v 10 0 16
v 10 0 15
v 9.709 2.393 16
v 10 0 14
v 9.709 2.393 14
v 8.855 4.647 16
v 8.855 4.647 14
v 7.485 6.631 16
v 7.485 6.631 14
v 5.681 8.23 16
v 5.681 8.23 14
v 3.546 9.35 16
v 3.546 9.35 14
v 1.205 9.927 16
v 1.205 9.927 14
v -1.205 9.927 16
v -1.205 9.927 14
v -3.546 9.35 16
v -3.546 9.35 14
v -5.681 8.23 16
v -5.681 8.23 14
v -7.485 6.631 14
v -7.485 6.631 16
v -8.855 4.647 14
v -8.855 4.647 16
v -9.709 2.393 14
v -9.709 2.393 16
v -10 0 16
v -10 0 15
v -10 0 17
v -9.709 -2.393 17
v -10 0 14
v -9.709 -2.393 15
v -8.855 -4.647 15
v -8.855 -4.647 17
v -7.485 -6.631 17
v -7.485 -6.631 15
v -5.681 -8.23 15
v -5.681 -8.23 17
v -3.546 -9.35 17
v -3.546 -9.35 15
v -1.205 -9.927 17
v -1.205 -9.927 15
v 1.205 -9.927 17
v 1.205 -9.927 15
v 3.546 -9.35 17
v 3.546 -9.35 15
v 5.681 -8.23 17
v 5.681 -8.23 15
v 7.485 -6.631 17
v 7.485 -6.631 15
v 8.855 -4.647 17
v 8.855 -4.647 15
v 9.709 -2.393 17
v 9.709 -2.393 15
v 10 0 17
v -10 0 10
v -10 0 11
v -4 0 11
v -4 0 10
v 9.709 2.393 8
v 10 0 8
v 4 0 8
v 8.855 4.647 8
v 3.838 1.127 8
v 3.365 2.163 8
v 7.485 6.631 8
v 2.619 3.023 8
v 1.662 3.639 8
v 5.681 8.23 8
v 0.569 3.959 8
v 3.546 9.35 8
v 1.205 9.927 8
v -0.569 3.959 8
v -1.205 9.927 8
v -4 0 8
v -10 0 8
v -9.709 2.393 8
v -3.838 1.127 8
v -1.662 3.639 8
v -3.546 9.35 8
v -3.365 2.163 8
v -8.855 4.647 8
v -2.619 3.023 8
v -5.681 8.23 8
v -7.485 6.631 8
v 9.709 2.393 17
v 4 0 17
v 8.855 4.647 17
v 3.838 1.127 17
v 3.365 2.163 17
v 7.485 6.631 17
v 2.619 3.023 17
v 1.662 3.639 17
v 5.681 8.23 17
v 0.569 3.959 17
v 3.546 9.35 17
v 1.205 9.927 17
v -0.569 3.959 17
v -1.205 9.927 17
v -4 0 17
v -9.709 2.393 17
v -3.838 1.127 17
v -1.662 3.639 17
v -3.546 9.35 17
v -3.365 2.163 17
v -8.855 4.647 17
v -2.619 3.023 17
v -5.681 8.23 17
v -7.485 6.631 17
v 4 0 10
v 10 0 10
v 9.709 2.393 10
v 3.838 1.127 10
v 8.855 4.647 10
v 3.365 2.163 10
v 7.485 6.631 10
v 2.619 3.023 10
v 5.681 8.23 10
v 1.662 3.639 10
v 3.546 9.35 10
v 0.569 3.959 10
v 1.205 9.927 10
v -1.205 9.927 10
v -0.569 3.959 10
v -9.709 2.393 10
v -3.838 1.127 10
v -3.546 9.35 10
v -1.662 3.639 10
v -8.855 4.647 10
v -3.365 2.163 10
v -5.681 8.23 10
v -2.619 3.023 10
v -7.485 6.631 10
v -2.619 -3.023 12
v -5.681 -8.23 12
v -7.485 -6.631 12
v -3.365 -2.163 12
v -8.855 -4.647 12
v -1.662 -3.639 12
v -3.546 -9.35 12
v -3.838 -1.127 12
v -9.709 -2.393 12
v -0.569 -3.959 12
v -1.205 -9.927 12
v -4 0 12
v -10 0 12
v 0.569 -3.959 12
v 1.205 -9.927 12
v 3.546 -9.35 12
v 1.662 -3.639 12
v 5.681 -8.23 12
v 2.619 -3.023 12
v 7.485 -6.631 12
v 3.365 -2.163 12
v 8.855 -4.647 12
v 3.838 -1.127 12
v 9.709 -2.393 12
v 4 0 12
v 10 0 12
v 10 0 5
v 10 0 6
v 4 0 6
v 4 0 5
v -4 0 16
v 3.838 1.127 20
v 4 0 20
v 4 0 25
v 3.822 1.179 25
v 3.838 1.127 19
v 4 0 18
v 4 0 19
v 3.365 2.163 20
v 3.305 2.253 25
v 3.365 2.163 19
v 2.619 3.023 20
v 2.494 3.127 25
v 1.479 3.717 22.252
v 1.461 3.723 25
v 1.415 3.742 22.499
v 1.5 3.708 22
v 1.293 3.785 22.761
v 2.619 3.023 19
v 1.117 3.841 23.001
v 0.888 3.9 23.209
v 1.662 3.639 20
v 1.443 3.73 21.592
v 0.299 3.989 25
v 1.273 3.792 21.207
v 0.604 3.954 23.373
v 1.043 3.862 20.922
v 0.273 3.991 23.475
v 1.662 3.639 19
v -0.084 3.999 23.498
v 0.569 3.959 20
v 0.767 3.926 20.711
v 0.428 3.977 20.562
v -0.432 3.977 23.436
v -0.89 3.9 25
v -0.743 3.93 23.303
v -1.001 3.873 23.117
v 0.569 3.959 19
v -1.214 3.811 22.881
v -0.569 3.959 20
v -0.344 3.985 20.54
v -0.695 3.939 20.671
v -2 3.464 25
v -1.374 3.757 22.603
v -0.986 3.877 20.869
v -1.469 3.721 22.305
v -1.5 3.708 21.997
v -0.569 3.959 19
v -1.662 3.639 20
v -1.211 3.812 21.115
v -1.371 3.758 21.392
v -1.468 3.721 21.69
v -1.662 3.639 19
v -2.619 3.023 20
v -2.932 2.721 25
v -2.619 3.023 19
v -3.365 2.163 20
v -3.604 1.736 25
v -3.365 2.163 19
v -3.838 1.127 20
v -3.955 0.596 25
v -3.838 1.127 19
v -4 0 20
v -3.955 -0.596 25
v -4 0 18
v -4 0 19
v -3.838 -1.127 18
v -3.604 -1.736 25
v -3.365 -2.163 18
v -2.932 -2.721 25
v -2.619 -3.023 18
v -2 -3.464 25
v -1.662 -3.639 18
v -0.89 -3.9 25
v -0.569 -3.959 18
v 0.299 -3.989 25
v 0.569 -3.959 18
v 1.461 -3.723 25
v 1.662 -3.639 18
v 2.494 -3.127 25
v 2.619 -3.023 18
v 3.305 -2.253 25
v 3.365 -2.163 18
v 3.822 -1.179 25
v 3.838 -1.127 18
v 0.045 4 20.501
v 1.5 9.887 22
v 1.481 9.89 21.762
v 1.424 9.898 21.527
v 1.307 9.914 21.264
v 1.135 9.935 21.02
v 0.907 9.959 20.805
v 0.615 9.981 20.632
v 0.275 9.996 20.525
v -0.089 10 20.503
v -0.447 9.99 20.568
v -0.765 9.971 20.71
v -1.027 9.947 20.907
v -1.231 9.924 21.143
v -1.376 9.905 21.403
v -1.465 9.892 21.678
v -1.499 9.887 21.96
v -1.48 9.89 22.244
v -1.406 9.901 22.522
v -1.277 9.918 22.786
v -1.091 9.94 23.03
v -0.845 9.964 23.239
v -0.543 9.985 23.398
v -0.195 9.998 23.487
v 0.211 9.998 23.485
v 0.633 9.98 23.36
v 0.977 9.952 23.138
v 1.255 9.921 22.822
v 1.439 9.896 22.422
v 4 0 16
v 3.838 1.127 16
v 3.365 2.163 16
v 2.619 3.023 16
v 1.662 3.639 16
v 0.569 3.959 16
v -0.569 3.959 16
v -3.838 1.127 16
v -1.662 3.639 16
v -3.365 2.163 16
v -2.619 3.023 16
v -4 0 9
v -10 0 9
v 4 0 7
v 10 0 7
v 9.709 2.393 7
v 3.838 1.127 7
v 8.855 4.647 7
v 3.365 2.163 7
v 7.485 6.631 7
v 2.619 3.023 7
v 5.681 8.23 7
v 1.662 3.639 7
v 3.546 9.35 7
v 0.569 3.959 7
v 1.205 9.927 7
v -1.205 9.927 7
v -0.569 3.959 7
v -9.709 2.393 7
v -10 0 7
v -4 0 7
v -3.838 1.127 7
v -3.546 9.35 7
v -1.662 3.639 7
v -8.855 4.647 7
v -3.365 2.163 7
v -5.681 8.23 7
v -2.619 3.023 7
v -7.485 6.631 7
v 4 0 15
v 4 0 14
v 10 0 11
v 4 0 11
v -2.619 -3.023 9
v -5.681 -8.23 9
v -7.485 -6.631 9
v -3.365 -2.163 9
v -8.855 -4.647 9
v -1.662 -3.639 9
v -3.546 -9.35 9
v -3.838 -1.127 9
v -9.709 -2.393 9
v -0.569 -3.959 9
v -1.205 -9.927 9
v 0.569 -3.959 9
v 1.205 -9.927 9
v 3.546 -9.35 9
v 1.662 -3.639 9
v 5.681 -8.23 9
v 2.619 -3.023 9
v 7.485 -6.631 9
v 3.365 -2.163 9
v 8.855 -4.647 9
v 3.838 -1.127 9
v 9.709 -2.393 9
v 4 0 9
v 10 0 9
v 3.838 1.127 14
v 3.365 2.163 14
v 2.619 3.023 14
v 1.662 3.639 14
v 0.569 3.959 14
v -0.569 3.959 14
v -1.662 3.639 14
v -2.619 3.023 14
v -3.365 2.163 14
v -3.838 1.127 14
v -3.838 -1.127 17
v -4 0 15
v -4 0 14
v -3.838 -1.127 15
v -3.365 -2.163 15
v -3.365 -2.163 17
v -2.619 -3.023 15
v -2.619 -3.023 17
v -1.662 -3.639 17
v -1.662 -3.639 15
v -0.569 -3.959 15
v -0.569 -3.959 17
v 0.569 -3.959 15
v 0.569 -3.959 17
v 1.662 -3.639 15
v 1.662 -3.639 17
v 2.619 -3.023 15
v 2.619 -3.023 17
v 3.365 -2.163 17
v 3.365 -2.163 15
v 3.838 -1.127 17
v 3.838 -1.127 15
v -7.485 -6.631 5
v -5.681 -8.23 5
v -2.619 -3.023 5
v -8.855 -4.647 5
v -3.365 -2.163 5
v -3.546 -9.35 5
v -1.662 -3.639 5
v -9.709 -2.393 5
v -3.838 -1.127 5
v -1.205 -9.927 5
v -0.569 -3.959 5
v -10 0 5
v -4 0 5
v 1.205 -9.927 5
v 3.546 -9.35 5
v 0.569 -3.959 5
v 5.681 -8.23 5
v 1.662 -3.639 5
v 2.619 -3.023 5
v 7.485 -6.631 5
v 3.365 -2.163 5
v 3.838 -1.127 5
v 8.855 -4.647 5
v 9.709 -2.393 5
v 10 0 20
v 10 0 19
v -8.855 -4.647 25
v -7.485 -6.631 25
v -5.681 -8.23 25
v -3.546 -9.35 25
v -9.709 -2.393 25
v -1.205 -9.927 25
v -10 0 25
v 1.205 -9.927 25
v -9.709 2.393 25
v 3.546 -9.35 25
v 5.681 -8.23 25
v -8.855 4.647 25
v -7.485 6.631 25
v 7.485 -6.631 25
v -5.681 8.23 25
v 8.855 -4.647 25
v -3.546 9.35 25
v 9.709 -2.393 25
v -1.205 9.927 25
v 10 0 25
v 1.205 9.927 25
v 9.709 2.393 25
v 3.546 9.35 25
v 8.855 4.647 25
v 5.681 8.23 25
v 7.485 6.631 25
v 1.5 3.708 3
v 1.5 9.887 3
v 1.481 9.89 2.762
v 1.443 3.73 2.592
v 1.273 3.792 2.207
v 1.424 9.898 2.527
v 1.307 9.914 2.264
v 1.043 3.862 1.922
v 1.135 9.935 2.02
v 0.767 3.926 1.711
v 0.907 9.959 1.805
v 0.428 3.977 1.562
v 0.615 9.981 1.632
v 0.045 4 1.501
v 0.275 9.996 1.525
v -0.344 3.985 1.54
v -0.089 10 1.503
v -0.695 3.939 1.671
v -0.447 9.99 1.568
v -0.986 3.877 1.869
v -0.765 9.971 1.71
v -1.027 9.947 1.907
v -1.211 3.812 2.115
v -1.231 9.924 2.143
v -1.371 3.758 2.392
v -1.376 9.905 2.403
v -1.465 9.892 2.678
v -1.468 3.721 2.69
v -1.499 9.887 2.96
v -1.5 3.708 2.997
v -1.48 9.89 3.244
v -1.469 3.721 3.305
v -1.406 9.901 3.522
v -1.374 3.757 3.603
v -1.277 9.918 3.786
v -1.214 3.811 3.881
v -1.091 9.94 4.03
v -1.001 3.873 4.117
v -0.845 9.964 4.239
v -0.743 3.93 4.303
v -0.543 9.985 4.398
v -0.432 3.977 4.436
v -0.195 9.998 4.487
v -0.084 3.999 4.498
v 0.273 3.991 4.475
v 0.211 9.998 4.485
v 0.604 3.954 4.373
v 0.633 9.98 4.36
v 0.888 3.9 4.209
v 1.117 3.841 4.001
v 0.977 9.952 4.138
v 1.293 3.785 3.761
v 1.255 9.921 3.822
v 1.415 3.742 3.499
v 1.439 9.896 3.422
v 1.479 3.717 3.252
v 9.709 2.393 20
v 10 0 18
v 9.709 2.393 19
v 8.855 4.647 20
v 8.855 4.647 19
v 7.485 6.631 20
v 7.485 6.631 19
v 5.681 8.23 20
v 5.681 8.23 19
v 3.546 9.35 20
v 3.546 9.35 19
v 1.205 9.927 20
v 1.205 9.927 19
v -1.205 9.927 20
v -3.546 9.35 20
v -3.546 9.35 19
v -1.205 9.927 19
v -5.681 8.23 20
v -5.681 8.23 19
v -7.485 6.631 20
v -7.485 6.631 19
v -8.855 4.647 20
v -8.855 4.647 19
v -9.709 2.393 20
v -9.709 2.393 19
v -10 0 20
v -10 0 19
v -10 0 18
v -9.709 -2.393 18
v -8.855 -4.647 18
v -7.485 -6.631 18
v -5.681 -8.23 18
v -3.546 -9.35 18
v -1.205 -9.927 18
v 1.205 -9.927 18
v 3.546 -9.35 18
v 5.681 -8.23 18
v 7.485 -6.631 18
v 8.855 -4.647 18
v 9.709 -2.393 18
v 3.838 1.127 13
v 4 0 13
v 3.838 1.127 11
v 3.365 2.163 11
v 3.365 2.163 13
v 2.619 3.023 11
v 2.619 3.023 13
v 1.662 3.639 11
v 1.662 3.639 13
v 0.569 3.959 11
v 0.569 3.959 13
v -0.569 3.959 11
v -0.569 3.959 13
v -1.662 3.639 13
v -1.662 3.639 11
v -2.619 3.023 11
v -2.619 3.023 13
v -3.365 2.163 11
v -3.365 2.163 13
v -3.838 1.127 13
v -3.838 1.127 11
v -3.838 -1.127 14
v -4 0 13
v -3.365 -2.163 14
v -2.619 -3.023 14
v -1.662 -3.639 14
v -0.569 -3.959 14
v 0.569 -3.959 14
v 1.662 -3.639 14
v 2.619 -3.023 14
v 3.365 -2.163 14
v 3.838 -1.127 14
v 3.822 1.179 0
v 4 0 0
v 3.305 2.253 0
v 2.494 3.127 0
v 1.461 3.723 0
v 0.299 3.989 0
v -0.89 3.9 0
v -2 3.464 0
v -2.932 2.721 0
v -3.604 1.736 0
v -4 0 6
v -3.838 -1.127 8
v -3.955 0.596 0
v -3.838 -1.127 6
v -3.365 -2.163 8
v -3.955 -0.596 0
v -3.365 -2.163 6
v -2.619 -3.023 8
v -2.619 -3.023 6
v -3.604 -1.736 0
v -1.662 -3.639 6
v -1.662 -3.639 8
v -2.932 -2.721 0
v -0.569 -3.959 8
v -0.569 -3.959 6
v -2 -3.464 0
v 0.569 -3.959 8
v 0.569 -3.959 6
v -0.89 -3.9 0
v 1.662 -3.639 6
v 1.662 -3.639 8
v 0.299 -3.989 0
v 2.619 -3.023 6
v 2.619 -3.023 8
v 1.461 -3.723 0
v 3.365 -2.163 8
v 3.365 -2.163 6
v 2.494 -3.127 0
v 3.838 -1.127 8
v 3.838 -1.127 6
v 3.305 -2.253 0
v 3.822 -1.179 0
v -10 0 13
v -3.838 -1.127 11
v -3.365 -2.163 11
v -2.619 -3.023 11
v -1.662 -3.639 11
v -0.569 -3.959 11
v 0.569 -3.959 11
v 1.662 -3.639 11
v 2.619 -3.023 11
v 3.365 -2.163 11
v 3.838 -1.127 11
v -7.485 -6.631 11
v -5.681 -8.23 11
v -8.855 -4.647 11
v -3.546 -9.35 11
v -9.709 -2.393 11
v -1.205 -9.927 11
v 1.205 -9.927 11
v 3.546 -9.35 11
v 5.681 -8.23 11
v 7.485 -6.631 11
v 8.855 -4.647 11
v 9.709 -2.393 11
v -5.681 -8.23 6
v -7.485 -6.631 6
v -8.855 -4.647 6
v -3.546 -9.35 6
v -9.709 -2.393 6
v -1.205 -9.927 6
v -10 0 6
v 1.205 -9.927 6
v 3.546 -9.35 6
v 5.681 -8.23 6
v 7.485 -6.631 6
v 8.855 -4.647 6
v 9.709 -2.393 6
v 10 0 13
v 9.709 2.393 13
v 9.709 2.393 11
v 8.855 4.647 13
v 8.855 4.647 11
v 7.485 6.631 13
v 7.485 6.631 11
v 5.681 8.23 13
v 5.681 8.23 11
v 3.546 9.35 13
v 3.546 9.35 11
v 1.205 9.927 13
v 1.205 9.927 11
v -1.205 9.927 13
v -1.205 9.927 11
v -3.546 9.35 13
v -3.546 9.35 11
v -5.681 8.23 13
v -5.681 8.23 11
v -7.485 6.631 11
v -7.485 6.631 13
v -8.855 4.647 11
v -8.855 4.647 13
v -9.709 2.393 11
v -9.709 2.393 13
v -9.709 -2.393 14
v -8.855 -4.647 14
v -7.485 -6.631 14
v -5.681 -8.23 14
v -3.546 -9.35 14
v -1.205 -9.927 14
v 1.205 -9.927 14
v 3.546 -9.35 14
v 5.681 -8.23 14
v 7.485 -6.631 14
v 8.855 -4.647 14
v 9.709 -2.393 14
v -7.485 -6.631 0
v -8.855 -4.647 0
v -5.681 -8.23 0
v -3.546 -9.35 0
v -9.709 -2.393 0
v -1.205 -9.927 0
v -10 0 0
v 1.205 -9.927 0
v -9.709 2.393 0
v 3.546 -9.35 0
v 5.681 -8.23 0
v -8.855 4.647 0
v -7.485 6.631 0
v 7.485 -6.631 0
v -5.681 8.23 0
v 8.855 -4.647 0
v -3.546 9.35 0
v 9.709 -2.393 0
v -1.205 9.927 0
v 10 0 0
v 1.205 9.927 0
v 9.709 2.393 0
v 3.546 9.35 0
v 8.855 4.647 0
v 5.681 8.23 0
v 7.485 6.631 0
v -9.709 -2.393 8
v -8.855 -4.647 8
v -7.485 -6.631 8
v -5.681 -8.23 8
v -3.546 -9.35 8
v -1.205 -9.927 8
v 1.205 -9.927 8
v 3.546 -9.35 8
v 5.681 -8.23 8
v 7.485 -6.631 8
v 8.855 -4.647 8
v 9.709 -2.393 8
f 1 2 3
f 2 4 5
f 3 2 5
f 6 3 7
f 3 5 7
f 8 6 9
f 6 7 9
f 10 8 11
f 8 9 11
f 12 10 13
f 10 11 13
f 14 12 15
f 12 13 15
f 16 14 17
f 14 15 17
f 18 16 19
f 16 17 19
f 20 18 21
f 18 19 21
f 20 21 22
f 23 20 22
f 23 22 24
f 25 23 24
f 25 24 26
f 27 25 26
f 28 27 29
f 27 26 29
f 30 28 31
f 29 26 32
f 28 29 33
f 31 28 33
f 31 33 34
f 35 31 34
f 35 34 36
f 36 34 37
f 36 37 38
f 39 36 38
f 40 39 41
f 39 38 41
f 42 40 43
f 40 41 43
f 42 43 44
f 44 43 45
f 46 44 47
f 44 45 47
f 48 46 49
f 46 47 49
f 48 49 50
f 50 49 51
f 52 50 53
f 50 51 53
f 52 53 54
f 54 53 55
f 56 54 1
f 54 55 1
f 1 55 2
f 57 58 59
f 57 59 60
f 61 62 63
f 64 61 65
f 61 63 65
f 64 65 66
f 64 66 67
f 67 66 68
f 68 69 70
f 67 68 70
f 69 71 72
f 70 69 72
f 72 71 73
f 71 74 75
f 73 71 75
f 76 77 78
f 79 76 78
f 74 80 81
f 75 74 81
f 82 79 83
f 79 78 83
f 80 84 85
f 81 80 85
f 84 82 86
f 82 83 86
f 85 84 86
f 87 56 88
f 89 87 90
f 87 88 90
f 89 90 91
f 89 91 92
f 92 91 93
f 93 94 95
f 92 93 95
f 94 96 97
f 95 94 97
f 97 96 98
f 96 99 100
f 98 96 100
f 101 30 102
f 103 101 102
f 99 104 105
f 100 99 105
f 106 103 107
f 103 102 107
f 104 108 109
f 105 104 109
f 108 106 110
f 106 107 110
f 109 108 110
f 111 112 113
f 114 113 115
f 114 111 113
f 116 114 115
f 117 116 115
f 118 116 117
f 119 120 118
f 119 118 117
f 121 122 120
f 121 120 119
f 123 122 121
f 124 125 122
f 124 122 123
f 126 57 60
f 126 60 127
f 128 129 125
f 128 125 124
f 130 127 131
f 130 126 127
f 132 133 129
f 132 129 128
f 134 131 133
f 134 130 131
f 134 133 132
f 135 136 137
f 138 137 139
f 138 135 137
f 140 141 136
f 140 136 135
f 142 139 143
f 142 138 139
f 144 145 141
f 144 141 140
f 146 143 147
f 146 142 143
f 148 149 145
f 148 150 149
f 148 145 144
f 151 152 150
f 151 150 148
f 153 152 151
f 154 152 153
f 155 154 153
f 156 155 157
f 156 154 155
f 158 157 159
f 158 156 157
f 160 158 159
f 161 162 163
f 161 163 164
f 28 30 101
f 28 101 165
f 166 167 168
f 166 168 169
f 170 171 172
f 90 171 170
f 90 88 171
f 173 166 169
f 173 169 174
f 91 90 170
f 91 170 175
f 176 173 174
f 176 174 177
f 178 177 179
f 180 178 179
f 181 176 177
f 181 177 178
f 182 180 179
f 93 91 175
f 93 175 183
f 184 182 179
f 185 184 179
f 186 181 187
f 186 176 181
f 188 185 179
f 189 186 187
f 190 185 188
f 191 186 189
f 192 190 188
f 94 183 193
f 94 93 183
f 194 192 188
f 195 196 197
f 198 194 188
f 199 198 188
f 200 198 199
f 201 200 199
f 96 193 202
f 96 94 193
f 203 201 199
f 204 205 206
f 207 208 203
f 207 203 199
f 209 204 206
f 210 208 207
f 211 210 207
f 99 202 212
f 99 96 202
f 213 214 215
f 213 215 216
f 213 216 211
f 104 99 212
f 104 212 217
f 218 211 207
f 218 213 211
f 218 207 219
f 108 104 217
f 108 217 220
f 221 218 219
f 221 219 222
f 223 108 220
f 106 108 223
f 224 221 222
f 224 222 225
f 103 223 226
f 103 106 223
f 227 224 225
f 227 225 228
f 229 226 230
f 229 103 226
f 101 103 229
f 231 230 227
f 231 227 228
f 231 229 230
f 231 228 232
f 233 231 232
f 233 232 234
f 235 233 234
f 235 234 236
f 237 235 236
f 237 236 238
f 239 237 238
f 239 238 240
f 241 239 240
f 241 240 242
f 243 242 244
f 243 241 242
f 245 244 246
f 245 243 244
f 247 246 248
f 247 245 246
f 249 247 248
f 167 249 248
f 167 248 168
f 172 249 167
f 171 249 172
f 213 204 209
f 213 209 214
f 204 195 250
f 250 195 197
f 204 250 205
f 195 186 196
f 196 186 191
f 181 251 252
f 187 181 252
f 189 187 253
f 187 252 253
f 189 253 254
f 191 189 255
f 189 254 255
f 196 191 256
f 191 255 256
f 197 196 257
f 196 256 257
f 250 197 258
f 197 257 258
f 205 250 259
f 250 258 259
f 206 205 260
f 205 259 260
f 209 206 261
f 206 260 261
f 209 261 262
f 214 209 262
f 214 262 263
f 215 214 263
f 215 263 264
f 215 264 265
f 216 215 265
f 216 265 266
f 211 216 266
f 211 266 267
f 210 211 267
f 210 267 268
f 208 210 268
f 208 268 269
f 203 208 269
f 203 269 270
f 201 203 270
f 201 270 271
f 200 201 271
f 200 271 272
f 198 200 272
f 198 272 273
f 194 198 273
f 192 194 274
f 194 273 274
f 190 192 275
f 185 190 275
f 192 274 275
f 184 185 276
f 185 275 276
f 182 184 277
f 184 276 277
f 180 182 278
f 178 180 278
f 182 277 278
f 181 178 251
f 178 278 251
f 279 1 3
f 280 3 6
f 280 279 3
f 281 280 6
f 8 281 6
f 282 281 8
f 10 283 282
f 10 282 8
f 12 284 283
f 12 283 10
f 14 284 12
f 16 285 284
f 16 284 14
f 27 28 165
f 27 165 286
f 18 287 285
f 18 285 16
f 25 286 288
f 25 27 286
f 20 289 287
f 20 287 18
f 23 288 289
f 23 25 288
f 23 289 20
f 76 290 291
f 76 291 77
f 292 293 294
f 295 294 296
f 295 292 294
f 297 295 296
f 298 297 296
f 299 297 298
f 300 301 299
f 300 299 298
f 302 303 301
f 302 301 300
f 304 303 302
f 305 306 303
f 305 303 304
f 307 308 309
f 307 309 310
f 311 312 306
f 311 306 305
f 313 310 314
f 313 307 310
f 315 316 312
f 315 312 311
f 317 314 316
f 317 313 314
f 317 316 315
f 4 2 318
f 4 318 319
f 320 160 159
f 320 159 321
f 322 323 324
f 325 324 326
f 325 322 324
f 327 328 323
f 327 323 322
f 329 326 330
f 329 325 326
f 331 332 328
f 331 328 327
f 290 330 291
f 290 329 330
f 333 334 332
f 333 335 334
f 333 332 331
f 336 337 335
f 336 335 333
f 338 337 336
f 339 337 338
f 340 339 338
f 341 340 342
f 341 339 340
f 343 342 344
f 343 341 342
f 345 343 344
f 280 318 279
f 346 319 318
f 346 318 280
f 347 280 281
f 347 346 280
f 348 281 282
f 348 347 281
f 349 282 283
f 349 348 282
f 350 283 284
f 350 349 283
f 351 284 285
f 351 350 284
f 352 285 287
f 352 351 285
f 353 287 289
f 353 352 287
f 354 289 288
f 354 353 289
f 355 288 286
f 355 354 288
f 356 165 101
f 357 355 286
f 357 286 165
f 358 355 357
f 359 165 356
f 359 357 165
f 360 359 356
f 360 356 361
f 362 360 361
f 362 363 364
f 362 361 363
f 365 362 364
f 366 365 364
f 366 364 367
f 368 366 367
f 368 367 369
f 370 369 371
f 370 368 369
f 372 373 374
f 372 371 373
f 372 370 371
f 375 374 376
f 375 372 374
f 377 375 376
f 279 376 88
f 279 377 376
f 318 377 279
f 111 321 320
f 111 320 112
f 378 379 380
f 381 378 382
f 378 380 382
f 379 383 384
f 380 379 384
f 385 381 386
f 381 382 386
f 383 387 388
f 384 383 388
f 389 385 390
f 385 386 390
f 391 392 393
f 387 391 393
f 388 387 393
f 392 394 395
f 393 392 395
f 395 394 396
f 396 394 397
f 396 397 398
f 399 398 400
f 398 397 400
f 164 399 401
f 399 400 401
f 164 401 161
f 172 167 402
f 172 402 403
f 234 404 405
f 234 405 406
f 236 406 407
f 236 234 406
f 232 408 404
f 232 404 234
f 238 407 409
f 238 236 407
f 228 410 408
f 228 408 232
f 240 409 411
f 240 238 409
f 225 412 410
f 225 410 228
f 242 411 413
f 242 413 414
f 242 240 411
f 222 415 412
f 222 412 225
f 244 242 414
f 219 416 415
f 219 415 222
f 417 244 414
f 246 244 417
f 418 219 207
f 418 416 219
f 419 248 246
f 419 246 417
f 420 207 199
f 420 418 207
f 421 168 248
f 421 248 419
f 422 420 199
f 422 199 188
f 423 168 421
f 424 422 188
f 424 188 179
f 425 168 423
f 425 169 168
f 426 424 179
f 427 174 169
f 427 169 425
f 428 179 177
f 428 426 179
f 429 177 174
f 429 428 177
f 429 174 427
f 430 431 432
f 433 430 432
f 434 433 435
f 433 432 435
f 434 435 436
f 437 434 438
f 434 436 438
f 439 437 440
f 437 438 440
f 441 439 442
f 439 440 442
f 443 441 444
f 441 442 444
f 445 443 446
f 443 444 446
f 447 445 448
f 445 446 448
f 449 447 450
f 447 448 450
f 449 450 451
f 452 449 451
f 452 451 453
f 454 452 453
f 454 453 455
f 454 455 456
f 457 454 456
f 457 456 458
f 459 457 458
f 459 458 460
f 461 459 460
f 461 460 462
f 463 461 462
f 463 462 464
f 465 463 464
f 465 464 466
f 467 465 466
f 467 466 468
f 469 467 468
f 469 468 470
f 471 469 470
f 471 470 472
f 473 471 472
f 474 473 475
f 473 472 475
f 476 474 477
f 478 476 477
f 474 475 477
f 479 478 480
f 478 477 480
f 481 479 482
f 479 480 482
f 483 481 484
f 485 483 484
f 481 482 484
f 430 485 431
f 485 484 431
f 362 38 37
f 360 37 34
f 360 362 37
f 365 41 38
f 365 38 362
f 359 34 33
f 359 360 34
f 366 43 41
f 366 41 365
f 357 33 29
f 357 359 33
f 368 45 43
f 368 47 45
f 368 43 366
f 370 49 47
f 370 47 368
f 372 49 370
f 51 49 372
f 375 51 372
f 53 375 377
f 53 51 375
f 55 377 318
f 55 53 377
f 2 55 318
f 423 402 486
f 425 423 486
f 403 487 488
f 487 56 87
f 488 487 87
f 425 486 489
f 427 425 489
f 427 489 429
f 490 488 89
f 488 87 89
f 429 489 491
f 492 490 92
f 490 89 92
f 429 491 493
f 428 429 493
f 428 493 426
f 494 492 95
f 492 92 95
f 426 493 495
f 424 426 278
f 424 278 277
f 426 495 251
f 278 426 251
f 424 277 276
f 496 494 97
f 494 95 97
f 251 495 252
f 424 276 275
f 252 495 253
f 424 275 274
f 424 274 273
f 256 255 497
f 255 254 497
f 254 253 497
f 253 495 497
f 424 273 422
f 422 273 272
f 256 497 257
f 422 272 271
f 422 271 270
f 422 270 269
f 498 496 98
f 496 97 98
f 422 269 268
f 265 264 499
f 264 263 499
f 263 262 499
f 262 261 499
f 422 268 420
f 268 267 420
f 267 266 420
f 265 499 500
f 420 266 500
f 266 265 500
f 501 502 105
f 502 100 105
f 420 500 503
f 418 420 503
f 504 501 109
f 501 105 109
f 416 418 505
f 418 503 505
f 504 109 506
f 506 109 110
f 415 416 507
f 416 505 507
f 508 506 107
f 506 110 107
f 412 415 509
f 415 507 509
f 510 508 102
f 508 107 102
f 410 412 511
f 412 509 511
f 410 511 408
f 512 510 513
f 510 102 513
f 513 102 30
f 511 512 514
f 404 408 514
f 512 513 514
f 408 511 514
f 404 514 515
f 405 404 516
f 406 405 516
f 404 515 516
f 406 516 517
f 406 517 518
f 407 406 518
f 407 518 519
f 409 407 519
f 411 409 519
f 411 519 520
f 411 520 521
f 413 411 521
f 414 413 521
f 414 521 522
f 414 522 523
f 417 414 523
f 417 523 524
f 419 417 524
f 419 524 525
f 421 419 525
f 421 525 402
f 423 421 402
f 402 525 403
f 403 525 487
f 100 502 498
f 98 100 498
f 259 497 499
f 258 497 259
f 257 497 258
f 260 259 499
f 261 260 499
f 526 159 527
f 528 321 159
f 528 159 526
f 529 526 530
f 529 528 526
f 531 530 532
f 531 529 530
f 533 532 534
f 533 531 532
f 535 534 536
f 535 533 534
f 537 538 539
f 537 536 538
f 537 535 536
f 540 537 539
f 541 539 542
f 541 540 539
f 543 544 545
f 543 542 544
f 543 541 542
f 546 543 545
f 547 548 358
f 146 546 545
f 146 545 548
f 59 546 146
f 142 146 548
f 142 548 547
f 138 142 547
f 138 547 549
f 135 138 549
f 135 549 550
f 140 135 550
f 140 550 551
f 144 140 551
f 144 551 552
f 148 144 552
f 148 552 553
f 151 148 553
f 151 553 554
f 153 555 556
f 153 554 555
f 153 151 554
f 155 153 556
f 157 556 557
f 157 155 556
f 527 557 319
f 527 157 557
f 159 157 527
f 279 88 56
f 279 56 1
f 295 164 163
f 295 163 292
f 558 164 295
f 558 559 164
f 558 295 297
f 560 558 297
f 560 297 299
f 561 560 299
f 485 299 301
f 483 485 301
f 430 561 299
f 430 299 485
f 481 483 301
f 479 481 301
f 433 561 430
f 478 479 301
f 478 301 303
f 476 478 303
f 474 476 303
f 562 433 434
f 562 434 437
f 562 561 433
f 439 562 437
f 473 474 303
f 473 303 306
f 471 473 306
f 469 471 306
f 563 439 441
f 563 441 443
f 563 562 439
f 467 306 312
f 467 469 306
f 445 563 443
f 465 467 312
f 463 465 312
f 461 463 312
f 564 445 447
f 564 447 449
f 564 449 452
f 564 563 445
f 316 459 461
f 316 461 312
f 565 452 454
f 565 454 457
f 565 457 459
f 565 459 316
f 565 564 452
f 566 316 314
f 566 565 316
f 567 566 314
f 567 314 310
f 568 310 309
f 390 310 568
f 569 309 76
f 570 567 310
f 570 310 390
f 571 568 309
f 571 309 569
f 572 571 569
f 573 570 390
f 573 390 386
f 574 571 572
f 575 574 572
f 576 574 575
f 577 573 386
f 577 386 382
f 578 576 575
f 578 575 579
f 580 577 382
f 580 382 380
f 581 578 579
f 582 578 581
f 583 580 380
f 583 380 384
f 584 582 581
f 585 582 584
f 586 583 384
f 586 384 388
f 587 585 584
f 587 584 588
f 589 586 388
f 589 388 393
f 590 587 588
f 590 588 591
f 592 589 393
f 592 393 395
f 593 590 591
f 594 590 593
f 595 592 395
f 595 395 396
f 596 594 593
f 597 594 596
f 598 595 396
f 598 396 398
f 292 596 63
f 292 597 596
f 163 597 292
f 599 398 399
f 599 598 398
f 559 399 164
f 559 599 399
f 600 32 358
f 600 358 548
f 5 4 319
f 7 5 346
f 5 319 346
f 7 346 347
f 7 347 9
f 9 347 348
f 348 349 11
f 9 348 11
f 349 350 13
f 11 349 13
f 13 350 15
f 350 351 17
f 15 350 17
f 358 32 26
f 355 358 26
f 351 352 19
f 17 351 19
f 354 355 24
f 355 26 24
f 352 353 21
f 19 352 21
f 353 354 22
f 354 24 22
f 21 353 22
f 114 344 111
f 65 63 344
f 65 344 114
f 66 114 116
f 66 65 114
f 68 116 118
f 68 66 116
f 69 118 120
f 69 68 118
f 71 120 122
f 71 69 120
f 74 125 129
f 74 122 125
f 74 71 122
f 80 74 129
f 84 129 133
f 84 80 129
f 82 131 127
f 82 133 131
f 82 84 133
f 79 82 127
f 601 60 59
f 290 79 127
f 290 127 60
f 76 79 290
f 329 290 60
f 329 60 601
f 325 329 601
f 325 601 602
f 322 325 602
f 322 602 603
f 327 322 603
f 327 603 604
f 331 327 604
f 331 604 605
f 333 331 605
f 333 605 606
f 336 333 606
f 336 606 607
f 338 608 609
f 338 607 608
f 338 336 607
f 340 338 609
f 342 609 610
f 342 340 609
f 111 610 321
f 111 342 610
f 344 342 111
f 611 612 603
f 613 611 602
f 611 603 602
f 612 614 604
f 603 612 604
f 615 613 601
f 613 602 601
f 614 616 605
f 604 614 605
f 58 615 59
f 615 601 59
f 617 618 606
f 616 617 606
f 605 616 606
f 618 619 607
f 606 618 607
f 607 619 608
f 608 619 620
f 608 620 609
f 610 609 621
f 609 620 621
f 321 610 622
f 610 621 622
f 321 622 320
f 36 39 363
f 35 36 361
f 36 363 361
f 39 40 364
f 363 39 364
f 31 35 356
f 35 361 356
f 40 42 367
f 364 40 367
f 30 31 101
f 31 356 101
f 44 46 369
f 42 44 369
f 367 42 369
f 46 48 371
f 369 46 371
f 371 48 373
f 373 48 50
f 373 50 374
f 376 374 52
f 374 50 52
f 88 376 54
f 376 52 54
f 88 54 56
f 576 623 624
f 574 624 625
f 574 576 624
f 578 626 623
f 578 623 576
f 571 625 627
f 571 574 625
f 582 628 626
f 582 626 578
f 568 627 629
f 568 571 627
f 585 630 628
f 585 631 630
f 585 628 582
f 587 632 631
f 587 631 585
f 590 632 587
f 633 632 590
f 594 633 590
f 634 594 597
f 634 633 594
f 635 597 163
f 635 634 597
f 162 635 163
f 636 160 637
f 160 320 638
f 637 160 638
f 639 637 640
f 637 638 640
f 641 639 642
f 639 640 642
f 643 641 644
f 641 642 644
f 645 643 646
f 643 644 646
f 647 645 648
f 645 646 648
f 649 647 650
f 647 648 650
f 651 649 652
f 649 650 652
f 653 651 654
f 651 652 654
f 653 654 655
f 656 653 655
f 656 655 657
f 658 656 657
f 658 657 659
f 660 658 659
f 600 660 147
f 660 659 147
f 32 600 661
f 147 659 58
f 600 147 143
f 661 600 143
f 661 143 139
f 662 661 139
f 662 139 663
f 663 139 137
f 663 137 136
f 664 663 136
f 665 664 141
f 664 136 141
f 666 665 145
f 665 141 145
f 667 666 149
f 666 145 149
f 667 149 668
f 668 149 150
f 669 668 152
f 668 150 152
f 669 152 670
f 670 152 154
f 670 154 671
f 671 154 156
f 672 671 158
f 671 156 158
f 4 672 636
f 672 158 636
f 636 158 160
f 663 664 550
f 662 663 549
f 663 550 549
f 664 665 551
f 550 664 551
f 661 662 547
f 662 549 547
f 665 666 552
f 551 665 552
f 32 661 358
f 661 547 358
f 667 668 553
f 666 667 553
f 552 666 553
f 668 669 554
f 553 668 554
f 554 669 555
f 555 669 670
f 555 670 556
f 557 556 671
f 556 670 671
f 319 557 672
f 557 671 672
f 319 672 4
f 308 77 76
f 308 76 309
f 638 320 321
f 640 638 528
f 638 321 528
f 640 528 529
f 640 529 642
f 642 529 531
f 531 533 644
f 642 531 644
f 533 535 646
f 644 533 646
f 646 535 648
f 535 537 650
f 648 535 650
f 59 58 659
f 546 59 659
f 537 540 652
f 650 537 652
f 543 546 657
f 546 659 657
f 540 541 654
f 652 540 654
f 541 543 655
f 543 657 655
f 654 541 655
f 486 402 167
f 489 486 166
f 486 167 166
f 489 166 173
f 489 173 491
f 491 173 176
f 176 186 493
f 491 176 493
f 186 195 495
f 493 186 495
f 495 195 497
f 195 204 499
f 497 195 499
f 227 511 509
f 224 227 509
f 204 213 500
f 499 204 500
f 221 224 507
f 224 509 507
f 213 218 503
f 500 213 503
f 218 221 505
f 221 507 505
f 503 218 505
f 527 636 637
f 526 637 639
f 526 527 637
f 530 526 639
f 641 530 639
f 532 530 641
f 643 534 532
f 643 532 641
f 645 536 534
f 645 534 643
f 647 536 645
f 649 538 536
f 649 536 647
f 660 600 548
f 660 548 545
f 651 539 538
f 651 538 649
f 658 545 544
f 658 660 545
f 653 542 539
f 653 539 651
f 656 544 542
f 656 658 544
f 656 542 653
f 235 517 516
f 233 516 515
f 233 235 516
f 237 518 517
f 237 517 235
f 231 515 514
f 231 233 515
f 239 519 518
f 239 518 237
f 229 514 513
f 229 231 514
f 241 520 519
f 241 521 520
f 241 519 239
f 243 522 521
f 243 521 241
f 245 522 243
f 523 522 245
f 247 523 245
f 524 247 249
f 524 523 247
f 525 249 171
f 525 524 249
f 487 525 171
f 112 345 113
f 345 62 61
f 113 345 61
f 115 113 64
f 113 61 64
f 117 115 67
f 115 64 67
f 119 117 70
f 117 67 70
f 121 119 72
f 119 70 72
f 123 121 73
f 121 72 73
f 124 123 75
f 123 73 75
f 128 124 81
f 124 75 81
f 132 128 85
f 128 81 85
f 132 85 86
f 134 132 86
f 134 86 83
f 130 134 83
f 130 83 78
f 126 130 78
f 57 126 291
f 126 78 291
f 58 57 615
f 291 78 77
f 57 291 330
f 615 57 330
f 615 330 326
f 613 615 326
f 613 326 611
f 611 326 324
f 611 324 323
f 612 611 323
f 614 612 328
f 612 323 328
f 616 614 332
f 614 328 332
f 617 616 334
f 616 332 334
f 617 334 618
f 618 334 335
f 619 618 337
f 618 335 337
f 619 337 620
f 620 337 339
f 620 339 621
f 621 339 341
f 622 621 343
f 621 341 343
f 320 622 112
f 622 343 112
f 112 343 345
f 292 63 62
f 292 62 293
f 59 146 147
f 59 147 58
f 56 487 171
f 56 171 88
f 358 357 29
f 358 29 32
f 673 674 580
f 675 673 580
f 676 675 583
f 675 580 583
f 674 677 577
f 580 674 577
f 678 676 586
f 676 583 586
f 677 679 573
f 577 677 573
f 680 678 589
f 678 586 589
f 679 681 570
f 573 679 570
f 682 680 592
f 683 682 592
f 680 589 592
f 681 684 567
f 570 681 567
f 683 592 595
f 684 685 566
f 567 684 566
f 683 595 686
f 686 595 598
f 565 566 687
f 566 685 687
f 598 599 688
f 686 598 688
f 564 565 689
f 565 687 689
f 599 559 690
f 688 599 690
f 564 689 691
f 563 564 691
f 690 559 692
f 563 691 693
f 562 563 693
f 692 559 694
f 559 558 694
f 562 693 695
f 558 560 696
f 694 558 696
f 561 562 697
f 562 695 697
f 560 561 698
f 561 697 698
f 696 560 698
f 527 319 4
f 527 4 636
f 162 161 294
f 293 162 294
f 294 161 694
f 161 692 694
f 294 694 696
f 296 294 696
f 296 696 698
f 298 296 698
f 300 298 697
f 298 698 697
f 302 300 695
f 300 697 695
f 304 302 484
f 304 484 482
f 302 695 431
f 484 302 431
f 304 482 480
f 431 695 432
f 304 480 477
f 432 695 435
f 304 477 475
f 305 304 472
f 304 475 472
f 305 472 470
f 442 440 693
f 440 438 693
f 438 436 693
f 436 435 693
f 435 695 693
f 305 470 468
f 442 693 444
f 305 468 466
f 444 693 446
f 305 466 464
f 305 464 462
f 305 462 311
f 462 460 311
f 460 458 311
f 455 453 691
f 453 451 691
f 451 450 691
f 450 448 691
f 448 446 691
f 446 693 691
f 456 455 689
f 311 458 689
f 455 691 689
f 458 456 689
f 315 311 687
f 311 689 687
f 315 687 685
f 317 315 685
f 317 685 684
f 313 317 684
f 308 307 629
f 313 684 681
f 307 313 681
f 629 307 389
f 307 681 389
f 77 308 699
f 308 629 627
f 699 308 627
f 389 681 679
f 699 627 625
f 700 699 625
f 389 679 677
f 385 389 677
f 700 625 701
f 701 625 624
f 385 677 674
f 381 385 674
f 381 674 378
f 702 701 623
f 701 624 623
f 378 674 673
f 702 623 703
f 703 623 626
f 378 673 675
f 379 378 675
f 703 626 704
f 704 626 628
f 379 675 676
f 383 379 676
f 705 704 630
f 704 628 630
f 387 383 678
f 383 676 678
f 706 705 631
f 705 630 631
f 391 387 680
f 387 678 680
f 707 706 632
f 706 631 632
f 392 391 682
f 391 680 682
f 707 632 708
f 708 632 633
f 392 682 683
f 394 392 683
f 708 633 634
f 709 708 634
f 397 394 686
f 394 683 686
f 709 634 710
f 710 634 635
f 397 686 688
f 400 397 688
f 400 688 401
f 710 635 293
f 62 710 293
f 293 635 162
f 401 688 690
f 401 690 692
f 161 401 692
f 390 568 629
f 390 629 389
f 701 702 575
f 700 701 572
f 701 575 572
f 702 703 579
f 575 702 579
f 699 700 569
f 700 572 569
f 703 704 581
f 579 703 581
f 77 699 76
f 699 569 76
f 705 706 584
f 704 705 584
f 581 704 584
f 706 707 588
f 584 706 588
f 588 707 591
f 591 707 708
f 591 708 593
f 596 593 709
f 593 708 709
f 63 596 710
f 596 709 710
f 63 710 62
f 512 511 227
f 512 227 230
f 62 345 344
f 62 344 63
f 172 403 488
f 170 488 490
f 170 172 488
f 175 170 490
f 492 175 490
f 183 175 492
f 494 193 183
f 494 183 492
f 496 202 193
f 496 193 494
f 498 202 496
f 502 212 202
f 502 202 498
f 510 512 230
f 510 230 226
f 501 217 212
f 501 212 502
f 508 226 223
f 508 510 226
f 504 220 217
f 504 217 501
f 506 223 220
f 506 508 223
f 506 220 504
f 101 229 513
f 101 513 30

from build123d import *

# Parameters (mm, degrees)
SKETCH1_R           = 10
SKETCH1_R_2         = 4
BOSS_EXTRUDE1_DEPTH = 25
SKETCH2_W           = 1
SKETCH2_H           = 10
CUT_EXTRUDE1_DEPTH  = 25
LPATTERN1_COUNT     = 5
LPATTERN1_PITCH     = 3
CUT_EXTRUDE2_START  = 10
SKETCH3_R           = 1.5
CUT_EXTRUDE2_DEPTH  = 10


with BuildPart() as part:
    # Sketch1 → Boss-Extrude1 (new body)
    with BuildSketch(Plane.XY):
        Circle(SKETCH1_R)
        Circle(SKETCH1_R_2, mode=Mode.SUBTRACT)
    extrude(amount=BOSS_EXTRUDE1_DEPTH)

    # Sketch2 → Cut-Extrude1 (cut, symmetric)
    with BuildSketch(Plane(origin=(0, 0, 0), x_dir=(0, 0, -1), z_dir=(1, 0, 0))):
        with Locations((-19.5, 5)):
            Rectangle(SKETCH2_W, SKETCH2_H)
        with Locations((-17.5, -5)):
            Rectangle(SKETCH2_W, SKETCH2_H)
    cut_extrude1 = extrude(amount=CUT_EXTRUDE1_DEPTH, both=True, mode=Mode.SUBTRACT)

    # LPattern1: Cut-Extrude1 ×5
    with Locations(*[(0, 0, -i * LPATTERN1_PITCH) for i in range(1, LPATTERN1_COUNT)]):
        add(cut_extrude1, mode=Mode.SUBTRACT)

    # Sketch3 → Cut-Extrude2 (cut)
    with BuildSketch(Plane(origin=(0, 0, 0), x_dir=(1, 0, 0), z_dir=(0, 1, 0)).offset(CUT_EXTRUDE2_START)):
        with Locations((0, -3)):
            Circle(SKETCH3_R)
        with Locations((0, -22)):
            Circle(SKETCH3_R)
    extrude(amount=-CUT_EXTRUDE2_DEPTH, mode=Mode.SUBTRACT)


solid = part.part
